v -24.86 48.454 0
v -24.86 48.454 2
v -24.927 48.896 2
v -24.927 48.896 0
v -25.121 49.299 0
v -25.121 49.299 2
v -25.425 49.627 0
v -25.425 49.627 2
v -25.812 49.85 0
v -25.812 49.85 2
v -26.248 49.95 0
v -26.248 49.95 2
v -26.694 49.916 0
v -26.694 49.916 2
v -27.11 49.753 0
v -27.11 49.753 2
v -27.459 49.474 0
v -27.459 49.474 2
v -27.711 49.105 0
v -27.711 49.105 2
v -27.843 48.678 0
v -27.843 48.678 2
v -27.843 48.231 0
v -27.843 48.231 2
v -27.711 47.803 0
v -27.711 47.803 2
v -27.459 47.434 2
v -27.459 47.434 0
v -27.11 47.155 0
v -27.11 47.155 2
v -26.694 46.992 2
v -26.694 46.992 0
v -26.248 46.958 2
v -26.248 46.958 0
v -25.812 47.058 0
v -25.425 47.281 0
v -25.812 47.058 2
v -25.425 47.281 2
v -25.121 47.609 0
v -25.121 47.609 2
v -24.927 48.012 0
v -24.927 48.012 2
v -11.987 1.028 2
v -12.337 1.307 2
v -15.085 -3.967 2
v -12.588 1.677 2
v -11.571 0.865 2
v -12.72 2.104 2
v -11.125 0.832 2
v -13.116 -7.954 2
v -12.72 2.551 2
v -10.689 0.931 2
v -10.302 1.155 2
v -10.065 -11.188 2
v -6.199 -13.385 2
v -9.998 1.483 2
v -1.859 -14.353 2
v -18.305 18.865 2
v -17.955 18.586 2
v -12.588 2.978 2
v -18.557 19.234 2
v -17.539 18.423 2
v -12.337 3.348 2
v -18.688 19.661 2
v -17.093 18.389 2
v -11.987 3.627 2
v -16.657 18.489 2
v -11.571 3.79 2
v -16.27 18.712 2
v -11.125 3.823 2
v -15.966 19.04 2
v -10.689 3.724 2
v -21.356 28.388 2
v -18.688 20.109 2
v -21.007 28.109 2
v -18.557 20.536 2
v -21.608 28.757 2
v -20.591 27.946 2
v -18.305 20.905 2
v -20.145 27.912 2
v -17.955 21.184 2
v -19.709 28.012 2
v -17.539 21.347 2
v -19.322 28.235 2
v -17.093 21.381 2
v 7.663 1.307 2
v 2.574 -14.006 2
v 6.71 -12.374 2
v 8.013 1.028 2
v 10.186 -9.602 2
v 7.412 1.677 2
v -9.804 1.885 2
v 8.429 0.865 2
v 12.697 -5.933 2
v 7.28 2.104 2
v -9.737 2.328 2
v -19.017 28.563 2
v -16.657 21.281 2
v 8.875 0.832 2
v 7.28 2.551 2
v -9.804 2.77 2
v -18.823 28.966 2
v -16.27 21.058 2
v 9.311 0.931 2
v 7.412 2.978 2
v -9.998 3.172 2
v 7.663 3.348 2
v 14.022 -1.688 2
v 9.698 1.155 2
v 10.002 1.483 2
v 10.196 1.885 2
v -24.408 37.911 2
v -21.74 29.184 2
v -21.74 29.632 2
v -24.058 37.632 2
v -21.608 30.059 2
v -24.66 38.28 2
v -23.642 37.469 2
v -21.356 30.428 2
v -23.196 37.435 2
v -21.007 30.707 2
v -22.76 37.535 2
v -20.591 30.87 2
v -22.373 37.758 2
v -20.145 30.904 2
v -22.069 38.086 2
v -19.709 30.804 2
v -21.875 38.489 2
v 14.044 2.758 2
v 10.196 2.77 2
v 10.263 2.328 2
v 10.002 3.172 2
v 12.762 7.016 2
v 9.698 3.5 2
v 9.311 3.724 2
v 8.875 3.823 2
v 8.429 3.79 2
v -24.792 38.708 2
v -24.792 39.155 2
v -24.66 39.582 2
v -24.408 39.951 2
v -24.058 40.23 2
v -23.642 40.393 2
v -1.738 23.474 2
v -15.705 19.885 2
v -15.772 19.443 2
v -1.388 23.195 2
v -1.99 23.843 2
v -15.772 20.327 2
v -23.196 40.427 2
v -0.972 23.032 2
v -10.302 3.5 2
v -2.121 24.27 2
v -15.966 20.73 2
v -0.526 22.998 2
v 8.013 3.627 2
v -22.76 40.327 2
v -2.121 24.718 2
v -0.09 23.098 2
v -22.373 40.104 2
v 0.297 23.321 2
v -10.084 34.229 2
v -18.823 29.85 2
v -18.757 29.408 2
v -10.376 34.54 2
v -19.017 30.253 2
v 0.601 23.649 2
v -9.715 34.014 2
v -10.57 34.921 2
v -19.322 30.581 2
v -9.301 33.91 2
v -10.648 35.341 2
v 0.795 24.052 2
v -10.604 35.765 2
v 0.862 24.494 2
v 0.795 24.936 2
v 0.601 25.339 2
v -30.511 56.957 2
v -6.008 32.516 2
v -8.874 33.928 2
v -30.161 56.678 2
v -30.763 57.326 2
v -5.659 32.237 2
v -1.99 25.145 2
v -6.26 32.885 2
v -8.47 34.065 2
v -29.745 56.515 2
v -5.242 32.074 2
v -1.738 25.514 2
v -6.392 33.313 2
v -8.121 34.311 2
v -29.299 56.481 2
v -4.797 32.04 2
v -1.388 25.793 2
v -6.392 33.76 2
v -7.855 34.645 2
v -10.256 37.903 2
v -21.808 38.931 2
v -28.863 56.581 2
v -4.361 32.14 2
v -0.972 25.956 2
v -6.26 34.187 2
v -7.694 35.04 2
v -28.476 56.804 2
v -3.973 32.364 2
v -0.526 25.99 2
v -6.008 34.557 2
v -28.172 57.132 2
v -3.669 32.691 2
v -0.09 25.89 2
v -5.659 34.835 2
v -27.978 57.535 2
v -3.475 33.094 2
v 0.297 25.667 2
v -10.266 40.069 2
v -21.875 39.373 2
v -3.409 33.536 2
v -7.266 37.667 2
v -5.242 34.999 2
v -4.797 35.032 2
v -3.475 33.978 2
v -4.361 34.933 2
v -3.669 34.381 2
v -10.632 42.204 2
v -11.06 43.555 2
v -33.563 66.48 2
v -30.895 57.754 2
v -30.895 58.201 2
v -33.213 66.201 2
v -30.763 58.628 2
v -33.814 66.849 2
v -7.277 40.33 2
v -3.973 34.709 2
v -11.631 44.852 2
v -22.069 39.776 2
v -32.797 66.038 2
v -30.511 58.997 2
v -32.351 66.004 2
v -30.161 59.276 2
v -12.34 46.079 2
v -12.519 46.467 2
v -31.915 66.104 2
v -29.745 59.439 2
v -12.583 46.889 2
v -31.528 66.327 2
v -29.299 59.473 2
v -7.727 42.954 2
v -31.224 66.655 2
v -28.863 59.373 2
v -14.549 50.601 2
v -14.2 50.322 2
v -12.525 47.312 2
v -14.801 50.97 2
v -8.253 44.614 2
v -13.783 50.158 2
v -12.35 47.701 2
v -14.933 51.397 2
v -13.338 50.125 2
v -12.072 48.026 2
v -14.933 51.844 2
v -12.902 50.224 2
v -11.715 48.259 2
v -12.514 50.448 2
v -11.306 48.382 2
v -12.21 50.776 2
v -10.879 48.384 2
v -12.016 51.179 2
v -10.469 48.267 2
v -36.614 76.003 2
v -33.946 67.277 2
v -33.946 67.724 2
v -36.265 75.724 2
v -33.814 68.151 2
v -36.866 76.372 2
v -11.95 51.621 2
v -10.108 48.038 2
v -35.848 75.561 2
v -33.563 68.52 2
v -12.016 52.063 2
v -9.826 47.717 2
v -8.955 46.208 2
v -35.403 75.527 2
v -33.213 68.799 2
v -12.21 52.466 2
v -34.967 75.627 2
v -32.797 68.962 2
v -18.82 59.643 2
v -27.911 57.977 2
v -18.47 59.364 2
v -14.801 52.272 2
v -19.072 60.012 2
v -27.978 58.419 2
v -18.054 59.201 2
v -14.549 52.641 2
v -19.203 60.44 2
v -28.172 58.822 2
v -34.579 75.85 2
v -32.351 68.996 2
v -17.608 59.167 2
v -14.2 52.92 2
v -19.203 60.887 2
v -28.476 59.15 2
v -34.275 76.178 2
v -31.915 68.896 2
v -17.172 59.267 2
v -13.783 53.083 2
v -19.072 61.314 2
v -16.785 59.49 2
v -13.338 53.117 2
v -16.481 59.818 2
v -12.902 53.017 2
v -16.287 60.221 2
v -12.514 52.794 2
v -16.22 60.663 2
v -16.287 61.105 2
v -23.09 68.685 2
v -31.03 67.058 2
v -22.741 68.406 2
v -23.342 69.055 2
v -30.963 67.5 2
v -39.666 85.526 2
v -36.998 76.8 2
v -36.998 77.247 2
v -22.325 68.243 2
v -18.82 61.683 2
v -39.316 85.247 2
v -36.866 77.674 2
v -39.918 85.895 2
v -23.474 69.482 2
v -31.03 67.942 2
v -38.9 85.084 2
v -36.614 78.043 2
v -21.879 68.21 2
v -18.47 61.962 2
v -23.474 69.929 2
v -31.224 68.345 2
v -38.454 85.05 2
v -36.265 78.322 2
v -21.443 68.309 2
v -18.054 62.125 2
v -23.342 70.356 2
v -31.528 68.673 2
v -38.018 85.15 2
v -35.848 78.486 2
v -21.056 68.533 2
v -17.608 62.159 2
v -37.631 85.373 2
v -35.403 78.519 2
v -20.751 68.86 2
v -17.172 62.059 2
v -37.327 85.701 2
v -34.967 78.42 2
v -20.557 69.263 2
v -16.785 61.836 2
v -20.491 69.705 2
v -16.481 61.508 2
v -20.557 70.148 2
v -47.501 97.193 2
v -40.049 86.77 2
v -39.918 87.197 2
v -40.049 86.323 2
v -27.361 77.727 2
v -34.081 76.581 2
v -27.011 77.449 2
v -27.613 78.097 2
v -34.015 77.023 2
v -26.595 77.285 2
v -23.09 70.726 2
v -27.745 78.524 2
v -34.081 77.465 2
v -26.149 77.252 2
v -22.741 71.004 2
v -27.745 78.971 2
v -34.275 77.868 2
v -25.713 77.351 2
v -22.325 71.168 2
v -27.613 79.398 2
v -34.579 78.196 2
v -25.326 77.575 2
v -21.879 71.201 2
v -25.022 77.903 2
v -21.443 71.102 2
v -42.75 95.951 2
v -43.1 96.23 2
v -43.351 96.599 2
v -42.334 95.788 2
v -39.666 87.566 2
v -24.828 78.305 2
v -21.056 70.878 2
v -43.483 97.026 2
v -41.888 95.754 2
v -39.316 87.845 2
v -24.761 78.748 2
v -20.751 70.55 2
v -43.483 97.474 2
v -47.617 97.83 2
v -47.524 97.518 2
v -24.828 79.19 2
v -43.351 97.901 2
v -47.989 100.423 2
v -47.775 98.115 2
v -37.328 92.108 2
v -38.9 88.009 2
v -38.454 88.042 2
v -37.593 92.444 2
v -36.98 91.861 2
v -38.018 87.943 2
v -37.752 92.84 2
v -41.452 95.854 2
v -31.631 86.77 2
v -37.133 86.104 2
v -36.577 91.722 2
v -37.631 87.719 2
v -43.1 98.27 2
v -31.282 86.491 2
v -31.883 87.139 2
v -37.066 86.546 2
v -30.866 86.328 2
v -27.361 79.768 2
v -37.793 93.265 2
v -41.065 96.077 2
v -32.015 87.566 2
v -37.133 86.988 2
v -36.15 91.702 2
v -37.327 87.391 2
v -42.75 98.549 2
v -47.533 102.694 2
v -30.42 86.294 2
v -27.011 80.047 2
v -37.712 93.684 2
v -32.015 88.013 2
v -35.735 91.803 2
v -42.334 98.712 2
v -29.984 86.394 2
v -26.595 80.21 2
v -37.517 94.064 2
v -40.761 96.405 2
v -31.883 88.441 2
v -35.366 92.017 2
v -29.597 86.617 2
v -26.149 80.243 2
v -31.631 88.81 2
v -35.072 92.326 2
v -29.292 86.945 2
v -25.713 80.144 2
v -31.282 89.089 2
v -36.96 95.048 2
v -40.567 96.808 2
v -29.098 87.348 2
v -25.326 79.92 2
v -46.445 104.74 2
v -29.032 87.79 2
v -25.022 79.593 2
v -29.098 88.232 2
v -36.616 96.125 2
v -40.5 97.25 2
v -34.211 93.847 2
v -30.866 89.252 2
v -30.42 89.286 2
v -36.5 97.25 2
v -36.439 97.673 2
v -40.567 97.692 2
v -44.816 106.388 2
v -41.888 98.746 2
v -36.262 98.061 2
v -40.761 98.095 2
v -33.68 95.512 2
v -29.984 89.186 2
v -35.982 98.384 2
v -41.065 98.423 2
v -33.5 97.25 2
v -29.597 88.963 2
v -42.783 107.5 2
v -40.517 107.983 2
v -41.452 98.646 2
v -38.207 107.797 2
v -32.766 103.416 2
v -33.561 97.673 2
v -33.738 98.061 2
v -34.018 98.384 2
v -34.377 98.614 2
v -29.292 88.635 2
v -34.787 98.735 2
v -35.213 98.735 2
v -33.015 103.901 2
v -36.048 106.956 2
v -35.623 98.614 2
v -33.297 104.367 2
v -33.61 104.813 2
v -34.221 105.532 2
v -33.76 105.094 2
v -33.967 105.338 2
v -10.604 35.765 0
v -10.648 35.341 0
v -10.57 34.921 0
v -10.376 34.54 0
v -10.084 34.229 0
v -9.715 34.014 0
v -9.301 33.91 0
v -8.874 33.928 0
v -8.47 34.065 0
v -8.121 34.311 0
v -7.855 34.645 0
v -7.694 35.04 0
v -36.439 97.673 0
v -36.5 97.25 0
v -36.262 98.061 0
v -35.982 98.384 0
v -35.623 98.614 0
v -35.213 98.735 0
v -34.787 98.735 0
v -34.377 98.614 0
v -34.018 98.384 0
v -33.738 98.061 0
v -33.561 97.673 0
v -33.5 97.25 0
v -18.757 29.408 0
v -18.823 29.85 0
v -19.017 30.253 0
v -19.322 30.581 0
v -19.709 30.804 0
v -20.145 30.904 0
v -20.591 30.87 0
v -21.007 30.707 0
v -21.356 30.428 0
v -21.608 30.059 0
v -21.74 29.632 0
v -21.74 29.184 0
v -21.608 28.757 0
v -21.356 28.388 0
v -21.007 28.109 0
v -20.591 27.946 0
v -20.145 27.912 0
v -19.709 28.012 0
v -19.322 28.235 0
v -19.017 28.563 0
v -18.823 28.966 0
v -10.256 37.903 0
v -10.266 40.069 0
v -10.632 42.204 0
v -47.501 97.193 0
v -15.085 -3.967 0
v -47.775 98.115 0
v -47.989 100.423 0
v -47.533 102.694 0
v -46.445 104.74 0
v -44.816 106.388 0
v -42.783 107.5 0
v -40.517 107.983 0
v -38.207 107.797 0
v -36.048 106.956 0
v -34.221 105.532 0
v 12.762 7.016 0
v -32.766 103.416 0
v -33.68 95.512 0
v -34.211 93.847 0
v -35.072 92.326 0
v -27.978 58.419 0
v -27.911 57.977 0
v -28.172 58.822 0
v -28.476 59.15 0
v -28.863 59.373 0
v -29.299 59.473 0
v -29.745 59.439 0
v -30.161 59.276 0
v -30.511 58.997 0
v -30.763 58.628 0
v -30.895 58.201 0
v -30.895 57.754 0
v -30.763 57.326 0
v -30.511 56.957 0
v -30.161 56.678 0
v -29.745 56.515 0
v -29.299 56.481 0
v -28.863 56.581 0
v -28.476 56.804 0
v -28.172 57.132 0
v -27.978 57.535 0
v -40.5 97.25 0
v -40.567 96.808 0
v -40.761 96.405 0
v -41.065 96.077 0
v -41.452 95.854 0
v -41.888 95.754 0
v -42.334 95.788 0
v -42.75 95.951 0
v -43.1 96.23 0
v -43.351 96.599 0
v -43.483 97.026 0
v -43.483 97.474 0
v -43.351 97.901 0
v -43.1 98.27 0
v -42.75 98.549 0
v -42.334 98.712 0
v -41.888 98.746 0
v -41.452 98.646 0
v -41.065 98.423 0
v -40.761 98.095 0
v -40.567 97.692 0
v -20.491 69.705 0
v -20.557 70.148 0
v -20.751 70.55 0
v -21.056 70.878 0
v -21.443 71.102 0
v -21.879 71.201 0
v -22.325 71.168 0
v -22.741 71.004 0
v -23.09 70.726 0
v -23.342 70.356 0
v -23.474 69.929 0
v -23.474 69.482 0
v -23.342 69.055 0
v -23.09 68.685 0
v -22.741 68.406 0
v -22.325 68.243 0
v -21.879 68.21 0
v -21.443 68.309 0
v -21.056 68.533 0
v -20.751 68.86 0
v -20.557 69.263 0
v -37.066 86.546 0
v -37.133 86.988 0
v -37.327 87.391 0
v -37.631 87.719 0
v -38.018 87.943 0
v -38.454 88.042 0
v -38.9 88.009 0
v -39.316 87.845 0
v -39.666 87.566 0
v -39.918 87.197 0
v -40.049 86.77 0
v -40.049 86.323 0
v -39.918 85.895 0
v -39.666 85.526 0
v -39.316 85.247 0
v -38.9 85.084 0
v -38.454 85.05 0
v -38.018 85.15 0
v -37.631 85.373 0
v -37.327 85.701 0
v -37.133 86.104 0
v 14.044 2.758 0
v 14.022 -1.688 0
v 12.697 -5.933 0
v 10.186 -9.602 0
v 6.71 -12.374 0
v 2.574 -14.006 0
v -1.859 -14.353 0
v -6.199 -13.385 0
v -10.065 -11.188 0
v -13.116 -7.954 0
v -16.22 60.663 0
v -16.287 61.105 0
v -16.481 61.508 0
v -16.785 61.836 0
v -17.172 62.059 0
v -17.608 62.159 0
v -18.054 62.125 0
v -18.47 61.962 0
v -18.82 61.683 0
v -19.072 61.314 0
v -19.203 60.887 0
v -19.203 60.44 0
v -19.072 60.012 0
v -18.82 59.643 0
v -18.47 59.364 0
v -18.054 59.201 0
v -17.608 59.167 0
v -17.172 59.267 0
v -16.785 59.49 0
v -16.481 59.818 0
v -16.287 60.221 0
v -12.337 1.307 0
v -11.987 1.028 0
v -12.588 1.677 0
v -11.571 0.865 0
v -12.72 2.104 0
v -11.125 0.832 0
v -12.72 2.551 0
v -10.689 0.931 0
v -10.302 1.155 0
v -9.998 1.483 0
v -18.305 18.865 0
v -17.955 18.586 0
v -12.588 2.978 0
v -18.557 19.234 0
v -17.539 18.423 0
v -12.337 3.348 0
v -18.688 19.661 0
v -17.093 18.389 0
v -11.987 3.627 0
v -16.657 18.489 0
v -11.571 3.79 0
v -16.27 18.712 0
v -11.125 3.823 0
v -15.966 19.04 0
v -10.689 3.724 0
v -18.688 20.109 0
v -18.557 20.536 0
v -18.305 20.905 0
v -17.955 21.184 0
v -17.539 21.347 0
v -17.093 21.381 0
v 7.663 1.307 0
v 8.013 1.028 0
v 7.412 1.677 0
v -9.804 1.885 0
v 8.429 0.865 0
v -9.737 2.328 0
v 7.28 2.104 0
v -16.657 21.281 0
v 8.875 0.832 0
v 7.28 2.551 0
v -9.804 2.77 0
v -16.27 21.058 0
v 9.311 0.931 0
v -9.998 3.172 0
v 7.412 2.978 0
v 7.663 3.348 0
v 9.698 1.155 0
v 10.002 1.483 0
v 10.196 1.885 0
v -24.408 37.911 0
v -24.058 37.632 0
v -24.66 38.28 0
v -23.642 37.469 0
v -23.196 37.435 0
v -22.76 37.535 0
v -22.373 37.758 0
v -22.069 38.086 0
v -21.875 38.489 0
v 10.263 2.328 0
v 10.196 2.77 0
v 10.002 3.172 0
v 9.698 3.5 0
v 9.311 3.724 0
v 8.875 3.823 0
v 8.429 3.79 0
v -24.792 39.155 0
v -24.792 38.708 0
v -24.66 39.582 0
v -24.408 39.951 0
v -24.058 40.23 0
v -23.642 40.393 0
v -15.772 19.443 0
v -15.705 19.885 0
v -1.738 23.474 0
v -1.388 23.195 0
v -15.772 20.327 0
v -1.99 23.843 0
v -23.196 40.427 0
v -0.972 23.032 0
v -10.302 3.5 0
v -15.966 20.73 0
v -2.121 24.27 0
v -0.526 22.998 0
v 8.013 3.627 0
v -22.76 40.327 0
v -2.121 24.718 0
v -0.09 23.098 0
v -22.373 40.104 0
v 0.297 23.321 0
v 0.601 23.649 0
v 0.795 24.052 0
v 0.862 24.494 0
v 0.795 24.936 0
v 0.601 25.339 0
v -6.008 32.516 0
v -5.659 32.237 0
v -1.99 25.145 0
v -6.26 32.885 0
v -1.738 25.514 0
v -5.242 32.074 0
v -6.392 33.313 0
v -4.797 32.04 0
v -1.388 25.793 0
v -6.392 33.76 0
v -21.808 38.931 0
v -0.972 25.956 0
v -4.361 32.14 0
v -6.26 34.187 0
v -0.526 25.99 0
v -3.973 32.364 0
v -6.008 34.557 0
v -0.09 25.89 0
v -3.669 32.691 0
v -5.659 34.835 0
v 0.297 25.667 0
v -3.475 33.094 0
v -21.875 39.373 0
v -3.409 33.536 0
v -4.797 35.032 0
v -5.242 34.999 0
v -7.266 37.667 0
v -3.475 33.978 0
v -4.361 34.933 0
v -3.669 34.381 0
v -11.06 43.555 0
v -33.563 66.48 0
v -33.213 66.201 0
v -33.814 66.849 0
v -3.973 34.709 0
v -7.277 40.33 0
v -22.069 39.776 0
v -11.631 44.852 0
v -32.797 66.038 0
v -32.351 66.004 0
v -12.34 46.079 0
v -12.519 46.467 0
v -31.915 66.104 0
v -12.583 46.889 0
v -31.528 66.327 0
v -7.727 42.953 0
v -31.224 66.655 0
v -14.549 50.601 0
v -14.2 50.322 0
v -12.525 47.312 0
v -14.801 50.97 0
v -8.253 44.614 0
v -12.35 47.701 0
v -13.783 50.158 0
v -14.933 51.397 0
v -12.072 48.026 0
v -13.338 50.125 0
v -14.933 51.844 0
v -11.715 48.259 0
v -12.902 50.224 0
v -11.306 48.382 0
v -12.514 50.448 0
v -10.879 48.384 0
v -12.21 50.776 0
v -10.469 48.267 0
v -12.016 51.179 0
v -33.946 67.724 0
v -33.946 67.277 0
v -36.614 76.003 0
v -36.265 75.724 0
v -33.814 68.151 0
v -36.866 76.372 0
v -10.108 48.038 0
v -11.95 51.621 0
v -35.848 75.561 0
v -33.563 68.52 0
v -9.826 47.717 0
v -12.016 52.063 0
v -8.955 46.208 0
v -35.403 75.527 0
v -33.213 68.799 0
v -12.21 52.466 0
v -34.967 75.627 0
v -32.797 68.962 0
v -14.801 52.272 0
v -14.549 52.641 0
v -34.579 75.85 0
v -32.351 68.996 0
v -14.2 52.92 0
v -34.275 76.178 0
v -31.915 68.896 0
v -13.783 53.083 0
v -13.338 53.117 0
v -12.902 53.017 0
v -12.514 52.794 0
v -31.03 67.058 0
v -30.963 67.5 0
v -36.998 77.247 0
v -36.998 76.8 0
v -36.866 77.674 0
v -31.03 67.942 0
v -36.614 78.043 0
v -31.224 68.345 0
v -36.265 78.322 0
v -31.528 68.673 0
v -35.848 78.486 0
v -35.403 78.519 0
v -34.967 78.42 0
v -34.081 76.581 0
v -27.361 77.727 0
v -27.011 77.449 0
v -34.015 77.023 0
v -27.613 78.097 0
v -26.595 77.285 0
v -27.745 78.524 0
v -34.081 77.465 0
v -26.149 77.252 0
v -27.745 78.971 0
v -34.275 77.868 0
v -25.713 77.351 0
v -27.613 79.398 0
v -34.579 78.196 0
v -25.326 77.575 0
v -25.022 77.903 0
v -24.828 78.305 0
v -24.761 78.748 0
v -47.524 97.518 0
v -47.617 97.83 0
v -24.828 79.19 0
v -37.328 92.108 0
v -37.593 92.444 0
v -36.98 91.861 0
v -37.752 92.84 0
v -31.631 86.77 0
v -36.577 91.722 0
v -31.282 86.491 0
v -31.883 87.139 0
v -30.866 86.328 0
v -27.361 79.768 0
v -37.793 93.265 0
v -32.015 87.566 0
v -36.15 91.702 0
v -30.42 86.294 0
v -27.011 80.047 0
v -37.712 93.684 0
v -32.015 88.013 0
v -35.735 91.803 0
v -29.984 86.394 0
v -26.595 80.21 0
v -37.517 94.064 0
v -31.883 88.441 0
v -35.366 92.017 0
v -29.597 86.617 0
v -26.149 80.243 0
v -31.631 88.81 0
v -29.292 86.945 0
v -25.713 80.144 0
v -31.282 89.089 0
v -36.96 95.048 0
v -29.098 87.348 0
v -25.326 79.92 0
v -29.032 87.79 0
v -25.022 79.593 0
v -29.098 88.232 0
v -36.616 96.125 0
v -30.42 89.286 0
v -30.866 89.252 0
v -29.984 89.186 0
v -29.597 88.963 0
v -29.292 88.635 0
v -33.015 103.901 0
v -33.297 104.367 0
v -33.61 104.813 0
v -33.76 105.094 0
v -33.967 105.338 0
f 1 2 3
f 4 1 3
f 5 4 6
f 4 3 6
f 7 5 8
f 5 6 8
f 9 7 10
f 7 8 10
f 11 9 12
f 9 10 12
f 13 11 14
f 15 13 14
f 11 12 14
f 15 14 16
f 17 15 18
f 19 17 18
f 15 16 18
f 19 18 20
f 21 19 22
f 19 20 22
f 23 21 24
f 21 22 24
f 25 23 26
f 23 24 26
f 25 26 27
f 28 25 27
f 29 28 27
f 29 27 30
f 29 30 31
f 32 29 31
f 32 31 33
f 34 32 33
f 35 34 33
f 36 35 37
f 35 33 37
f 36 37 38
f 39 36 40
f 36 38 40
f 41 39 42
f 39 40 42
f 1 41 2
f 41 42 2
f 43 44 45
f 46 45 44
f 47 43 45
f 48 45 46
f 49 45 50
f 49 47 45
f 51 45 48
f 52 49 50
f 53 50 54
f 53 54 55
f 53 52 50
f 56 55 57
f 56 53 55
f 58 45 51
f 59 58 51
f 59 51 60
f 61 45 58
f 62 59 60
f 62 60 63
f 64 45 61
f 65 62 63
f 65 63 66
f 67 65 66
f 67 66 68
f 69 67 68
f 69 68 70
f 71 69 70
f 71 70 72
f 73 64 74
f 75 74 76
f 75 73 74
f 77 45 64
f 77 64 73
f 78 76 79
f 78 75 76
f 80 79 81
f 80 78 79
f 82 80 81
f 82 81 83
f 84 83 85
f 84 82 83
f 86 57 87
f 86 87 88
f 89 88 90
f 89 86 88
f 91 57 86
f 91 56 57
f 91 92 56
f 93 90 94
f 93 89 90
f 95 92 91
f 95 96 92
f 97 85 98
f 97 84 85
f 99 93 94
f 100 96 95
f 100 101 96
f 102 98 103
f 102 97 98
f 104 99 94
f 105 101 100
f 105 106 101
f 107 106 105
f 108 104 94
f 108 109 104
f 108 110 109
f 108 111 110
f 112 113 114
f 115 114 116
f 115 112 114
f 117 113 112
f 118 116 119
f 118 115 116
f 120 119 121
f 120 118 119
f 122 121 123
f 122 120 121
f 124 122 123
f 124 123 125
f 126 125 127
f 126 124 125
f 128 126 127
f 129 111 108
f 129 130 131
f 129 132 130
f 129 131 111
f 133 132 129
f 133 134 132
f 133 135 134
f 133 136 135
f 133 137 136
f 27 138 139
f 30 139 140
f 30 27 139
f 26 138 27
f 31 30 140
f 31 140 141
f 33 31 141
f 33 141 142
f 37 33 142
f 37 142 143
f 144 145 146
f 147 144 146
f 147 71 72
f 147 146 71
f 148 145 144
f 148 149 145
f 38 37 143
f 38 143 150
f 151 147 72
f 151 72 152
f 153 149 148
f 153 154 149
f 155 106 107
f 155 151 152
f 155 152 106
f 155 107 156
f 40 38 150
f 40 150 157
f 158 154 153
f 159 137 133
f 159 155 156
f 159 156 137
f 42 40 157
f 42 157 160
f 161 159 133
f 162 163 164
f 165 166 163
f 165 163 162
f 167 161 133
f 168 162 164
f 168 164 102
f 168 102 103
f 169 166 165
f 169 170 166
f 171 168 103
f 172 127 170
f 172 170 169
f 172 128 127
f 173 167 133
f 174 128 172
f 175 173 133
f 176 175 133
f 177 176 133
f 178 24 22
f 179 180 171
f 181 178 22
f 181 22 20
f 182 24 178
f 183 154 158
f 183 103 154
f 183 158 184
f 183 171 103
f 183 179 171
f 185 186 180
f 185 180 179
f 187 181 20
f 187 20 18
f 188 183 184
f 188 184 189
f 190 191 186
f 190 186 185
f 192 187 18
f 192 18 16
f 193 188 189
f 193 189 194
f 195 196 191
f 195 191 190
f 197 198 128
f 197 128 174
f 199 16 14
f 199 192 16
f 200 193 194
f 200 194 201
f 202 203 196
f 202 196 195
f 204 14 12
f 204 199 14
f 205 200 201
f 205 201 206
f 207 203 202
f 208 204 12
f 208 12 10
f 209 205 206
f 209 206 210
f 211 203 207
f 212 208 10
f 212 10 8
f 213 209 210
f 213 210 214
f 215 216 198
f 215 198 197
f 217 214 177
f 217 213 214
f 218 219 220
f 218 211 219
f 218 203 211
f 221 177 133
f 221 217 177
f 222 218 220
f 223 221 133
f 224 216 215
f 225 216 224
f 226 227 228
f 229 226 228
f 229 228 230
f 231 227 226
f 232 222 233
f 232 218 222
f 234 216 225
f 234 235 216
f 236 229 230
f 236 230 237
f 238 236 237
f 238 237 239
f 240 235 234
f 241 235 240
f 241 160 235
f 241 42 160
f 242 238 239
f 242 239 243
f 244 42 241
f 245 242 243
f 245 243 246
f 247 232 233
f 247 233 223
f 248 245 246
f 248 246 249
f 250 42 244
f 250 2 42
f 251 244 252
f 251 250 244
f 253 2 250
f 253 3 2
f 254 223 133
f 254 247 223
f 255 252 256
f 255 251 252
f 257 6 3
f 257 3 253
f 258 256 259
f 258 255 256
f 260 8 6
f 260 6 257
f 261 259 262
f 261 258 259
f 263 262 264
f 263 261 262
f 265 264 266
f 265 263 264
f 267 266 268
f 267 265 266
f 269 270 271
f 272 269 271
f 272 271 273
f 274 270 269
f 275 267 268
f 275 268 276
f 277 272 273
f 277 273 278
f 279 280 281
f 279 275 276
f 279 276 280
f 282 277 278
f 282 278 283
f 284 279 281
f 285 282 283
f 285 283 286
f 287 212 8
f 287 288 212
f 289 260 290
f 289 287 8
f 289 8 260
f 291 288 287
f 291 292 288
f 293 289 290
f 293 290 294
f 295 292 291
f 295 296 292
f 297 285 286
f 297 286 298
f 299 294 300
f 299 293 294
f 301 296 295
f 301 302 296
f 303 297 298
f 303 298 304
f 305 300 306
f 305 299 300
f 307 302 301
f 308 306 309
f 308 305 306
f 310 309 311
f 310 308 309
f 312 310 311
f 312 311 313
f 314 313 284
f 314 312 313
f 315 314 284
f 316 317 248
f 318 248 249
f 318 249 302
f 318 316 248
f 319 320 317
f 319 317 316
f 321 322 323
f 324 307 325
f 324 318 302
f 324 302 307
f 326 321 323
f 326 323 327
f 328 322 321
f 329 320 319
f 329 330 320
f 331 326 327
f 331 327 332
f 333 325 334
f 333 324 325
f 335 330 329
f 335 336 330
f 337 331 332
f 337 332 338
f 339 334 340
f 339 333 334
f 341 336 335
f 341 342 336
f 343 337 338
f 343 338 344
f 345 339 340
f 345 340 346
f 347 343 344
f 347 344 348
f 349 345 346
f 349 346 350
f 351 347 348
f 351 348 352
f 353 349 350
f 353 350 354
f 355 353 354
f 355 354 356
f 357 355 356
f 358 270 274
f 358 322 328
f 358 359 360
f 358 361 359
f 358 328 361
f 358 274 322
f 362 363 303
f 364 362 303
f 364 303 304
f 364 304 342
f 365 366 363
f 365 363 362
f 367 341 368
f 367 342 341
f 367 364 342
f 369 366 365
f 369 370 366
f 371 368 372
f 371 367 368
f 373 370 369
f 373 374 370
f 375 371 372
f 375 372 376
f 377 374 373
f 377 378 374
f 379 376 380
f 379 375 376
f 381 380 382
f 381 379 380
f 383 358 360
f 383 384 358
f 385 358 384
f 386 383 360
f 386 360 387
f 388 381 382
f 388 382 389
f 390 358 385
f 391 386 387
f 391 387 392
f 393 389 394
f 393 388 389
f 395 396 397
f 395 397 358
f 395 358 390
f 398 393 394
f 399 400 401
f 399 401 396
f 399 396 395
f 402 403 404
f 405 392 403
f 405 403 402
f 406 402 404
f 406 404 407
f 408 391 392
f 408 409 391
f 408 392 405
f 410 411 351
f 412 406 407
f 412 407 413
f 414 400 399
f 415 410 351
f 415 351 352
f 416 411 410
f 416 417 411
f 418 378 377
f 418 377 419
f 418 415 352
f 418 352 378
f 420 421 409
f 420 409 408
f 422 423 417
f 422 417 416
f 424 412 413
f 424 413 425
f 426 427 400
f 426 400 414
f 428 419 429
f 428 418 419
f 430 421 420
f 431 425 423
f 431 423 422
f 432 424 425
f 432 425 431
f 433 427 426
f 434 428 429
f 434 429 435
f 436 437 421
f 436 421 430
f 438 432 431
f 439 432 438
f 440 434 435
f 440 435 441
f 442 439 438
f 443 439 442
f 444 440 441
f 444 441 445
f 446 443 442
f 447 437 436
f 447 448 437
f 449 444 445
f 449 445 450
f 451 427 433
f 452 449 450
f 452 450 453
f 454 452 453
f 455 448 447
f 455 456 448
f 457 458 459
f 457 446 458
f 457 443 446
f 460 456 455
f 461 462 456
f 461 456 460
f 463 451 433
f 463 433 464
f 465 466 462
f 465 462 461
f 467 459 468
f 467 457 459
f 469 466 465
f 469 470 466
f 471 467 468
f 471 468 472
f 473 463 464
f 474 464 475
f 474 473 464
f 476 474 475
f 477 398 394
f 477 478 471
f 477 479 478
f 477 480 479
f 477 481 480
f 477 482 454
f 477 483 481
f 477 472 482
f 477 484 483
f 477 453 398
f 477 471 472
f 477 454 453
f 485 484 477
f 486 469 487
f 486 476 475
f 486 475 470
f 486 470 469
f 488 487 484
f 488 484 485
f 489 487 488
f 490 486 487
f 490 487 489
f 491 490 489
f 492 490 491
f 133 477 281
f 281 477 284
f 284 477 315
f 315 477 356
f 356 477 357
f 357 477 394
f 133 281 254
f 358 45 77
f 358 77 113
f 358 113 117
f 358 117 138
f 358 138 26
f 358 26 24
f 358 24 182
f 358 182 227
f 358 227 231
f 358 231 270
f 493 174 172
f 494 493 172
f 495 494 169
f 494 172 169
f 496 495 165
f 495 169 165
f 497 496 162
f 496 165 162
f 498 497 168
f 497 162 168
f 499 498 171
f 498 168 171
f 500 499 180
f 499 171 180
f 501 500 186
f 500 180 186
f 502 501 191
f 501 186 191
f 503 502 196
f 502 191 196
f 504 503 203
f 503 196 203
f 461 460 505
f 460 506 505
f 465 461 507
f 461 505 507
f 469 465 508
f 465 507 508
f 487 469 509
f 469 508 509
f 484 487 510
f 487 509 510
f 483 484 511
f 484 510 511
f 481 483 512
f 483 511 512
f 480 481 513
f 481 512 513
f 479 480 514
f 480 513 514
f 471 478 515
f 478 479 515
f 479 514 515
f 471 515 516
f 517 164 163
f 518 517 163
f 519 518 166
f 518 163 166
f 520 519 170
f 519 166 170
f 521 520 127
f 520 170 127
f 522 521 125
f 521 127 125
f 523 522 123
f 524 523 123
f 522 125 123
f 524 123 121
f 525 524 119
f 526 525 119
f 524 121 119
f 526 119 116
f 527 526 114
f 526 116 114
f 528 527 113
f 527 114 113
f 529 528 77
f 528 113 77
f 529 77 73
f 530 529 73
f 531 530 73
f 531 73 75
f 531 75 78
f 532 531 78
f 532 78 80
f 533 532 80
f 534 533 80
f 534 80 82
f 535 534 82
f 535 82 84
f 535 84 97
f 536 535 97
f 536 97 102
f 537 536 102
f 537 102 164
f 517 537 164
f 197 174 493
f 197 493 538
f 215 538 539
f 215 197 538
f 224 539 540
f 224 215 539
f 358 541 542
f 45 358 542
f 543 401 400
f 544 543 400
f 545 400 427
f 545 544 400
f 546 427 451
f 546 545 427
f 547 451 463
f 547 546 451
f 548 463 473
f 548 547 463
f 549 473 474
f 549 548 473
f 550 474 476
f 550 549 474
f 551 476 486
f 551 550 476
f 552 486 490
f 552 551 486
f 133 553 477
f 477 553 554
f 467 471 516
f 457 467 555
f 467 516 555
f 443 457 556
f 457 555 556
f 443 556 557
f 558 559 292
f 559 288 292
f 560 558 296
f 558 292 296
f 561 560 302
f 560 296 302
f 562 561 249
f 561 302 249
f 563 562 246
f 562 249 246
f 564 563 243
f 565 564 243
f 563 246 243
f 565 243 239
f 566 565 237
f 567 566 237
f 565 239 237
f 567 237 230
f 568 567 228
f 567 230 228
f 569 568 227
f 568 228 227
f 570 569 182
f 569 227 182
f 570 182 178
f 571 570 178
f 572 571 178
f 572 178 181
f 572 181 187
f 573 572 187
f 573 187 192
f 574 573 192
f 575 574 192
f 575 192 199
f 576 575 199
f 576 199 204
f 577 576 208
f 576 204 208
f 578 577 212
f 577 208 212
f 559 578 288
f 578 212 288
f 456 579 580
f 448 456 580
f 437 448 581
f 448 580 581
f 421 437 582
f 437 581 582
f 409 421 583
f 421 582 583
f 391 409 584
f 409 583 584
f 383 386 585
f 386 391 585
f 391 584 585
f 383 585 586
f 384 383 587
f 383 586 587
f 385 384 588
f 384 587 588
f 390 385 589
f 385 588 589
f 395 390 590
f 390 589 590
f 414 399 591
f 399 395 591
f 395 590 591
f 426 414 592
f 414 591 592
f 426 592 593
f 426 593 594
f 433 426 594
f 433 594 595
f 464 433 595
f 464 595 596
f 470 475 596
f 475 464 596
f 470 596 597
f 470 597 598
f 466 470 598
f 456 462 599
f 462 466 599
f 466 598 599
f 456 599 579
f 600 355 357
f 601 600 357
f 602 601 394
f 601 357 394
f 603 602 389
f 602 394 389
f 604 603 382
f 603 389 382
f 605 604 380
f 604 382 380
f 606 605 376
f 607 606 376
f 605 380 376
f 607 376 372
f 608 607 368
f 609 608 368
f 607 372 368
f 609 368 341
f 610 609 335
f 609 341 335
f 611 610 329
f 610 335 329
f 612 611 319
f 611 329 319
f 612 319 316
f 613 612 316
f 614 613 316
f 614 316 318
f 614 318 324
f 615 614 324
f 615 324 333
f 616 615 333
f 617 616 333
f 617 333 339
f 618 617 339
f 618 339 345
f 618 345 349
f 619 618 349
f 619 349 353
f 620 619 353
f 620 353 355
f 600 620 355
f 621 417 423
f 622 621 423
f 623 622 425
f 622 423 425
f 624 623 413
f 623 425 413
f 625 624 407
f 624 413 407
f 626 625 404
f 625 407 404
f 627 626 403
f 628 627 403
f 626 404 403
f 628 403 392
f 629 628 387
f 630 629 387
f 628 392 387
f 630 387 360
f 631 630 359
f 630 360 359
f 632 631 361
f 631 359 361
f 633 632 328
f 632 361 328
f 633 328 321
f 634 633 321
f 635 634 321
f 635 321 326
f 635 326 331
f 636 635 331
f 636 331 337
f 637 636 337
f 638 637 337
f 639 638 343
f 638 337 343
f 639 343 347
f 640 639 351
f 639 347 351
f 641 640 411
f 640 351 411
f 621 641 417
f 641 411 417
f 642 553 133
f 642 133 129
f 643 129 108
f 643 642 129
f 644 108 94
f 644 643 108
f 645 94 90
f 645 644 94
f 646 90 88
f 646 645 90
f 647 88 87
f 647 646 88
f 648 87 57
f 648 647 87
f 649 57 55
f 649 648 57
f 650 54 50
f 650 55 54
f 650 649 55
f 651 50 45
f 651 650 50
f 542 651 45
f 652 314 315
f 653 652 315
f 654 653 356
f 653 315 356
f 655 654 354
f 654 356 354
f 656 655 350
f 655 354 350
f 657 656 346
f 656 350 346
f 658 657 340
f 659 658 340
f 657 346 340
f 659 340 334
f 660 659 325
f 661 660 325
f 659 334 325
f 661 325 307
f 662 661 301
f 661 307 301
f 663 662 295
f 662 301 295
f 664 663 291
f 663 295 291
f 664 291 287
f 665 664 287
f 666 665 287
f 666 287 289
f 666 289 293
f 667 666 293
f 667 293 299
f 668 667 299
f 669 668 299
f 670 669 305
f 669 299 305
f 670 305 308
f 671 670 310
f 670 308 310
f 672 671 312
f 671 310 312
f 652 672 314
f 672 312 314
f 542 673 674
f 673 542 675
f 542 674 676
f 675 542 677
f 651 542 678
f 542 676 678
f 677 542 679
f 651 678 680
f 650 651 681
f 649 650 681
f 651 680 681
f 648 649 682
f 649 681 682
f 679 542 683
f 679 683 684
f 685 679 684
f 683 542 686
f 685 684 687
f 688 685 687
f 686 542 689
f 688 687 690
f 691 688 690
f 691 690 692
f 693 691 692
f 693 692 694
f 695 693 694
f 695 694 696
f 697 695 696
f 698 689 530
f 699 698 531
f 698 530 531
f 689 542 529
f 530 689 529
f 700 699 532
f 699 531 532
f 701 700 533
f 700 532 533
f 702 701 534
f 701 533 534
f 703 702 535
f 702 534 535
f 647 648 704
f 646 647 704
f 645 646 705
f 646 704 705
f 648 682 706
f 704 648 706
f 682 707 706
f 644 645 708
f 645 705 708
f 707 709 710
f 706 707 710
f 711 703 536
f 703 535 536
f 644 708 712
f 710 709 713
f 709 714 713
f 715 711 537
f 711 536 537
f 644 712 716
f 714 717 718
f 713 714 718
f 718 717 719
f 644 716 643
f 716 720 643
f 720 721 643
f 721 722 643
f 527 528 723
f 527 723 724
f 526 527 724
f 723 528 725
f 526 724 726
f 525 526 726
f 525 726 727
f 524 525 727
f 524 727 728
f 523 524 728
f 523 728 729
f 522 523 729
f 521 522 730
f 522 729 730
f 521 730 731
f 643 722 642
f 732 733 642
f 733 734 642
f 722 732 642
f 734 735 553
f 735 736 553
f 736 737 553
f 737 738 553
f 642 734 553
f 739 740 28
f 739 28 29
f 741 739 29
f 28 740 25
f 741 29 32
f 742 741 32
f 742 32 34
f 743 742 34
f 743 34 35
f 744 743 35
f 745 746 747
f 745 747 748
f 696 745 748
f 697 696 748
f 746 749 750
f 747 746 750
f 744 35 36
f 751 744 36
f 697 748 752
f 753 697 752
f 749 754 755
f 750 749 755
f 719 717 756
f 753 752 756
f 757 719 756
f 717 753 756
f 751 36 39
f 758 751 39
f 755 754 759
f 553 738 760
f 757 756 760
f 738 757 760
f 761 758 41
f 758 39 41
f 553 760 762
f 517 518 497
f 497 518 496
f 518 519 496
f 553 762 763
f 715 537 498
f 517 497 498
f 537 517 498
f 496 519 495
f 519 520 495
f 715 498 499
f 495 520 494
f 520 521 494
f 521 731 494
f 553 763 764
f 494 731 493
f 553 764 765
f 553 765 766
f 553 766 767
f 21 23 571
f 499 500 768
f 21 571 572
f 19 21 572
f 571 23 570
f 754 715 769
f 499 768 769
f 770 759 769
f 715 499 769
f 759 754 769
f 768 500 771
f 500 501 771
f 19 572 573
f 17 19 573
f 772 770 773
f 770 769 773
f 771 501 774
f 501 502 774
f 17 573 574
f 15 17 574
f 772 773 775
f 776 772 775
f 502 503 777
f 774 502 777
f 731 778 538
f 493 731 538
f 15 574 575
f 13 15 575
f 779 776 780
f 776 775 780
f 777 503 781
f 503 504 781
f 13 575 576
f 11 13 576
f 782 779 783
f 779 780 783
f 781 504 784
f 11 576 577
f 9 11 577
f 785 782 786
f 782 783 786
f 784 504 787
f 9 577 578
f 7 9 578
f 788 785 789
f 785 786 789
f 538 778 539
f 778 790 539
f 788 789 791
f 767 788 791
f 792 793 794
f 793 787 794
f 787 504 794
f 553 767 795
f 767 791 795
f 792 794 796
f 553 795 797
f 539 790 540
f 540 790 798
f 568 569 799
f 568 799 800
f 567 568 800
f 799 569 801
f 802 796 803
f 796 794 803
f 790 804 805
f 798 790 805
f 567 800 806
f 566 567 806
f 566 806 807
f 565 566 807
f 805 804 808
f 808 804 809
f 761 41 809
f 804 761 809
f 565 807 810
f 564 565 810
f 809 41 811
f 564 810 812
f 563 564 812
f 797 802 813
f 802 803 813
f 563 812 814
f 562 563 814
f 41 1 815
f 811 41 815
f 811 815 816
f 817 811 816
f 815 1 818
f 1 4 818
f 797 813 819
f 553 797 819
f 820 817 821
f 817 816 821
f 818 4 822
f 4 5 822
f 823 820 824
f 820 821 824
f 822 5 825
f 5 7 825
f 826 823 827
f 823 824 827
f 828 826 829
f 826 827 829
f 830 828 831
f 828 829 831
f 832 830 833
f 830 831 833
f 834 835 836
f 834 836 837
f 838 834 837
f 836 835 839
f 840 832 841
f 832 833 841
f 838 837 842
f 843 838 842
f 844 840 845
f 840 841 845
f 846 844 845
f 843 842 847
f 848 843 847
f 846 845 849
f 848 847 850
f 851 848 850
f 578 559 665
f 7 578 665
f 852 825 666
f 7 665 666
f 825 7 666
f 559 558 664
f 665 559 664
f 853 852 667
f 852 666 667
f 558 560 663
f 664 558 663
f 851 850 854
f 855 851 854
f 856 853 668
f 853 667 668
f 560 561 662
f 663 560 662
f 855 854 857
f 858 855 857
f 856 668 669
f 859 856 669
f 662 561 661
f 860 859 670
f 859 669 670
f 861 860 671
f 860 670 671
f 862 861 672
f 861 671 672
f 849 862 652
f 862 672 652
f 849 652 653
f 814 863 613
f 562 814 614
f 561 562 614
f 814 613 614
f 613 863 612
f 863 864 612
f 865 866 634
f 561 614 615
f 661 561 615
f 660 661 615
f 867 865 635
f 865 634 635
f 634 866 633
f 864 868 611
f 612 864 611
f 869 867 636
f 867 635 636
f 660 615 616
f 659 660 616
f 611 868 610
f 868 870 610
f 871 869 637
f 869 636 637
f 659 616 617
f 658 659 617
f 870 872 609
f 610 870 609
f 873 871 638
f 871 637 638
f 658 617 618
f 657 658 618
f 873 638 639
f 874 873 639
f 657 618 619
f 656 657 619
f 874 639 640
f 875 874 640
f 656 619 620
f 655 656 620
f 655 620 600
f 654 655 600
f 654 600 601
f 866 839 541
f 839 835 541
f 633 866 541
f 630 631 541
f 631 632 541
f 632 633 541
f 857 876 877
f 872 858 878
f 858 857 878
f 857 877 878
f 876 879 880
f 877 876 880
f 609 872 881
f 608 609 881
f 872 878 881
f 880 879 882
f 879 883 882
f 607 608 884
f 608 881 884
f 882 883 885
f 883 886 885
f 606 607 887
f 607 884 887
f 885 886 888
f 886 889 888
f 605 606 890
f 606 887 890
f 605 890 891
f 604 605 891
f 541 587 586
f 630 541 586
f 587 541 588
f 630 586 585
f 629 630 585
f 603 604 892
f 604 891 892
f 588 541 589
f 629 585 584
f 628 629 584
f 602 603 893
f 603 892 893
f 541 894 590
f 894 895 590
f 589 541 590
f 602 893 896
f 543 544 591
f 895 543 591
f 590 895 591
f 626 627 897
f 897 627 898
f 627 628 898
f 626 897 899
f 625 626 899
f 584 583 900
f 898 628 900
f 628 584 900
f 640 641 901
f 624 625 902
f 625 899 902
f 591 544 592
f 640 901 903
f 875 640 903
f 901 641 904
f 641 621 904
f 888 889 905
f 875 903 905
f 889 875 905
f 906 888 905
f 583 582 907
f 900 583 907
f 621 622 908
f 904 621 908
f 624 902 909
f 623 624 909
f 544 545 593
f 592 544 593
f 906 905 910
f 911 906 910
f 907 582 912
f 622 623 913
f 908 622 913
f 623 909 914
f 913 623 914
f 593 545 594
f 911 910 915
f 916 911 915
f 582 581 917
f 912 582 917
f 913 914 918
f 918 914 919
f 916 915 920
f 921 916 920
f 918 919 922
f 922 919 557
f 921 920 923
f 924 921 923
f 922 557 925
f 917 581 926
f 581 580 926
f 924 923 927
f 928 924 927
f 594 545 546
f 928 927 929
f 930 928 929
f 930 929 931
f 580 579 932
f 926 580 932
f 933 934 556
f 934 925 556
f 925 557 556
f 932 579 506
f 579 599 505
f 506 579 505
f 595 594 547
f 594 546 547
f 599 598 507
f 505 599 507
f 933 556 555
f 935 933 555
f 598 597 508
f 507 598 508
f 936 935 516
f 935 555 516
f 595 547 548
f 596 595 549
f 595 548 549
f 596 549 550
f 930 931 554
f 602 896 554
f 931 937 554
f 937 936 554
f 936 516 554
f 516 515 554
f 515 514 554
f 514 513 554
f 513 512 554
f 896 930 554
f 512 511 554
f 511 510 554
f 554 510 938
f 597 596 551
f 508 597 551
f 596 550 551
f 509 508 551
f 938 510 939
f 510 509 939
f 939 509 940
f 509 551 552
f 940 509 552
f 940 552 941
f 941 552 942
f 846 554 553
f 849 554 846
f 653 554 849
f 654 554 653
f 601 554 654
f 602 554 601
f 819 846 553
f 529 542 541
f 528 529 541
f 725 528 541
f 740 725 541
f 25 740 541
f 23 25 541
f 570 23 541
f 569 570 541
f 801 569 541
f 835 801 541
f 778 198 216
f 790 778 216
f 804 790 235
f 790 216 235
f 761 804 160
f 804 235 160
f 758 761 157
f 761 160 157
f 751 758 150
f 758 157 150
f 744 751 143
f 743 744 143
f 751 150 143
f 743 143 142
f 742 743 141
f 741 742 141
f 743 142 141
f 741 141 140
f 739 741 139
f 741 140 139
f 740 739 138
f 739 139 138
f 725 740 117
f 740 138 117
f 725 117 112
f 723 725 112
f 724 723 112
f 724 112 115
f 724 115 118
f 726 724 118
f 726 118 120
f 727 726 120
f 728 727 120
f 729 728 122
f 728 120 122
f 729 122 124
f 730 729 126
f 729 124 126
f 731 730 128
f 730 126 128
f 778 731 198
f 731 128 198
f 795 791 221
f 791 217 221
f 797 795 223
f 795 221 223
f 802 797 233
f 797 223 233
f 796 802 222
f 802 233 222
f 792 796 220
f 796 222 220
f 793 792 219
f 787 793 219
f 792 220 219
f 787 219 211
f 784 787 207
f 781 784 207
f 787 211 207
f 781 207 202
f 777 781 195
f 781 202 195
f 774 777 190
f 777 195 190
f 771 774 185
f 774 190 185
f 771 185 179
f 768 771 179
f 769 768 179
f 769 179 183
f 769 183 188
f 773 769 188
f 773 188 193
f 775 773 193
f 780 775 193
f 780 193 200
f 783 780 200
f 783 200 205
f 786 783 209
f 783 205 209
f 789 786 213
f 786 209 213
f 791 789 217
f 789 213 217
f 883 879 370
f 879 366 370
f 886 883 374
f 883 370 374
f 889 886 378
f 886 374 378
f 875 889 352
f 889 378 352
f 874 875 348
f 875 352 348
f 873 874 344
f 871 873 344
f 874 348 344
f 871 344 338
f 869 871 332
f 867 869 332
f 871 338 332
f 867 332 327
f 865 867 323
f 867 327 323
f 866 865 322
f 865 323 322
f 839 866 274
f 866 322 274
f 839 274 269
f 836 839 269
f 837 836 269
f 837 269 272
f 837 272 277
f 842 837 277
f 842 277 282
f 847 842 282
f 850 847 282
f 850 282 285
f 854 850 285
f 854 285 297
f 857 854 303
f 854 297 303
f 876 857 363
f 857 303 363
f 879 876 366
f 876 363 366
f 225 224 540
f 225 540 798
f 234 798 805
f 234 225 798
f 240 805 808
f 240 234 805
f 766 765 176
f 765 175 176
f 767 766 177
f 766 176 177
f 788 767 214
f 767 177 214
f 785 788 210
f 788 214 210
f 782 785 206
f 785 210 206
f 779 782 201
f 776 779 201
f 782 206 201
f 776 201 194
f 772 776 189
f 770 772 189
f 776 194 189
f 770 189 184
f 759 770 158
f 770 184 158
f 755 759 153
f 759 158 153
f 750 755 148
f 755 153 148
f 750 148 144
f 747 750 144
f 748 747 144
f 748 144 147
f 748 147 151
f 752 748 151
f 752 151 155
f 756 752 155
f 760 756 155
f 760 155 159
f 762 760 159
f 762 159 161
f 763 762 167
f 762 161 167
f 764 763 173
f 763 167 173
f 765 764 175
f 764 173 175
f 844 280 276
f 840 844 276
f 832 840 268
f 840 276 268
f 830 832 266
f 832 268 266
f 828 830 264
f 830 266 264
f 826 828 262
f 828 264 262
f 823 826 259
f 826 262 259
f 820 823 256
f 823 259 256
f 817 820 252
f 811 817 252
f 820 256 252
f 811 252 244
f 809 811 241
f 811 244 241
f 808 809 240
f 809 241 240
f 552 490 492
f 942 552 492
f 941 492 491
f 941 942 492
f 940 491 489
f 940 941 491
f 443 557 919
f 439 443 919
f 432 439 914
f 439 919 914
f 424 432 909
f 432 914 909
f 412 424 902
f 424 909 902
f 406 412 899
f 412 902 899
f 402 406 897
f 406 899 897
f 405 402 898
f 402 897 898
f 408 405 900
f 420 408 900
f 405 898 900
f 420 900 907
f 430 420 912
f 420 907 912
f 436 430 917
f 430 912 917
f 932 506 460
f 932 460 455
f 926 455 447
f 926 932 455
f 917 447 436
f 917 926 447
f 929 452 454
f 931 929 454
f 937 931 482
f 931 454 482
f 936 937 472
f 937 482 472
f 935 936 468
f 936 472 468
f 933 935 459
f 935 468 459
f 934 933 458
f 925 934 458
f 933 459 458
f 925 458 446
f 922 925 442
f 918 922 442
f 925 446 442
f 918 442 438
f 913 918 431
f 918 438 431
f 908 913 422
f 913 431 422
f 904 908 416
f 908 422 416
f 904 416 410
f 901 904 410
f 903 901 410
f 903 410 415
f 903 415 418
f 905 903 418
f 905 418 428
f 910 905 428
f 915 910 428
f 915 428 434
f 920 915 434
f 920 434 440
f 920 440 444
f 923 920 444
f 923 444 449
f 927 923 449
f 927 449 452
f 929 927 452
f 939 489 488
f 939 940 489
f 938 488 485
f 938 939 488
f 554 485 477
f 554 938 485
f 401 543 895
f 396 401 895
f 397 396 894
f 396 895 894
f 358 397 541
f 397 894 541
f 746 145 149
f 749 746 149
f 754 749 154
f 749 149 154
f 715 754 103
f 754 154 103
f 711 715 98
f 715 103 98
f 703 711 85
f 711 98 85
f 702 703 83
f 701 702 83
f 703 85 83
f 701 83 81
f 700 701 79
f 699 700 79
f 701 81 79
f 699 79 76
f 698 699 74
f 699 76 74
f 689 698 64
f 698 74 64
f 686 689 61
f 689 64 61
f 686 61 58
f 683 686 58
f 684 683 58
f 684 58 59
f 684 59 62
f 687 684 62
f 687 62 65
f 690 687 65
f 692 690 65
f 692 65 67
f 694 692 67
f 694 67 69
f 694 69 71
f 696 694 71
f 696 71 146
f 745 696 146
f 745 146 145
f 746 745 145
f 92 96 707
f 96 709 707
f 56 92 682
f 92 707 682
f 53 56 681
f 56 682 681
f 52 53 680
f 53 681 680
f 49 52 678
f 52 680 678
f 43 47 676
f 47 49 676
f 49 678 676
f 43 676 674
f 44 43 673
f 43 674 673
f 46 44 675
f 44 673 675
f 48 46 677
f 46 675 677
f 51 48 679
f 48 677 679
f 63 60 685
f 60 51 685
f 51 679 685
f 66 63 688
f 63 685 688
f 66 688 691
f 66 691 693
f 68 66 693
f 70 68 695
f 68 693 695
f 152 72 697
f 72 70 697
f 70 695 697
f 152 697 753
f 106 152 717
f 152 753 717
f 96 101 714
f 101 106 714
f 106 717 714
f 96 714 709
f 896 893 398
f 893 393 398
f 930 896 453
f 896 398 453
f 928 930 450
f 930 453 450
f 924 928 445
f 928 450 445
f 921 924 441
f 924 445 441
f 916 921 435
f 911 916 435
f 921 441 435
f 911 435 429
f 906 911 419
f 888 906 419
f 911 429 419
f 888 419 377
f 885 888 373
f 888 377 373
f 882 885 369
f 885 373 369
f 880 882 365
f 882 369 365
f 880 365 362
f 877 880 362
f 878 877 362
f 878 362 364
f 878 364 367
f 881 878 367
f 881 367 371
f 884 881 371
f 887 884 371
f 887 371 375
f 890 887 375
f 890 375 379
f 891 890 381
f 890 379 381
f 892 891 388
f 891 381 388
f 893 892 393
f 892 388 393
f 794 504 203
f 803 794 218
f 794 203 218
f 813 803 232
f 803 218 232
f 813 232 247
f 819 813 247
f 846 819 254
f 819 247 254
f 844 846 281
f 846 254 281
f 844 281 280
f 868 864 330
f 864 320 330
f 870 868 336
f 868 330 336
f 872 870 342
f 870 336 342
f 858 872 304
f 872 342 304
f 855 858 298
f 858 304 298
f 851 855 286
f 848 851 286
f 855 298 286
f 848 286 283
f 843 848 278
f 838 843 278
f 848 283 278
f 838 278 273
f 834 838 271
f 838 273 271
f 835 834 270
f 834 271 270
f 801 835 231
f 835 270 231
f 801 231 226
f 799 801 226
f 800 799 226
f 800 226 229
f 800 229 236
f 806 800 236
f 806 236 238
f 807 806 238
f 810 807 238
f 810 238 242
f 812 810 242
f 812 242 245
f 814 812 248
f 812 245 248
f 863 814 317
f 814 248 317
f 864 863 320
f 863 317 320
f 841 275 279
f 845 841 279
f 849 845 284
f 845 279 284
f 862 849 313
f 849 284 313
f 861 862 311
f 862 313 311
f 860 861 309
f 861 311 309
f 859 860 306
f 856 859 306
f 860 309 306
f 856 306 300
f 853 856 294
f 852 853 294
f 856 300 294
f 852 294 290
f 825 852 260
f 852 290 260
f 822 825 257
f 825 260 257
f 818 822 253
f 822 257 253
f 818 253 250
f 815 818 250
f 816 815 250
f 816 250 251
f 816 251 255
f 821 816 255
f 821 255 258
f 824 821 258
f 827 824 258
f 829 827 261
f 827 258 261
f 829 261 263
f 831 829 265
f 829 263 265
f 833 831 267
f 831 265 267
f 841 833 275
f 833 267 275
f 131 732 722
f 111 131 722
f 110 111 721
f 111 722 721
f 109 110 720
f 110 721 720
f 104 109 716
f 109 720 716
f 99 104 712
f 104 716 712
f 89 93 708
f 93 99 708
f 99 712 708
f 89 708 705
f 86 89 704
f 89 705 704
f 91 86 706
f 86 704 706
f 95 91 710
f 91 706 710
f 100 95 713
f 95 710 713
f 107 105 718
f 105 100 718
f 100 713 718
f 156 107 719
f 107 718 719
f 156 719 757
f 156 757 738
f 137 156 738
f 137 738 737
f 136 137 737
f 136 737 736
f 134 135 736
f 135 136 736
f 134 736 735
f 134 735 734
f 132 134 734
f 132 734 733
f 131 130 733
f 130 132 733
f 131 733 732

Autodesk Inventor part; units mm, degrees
ref_plane "YZ Plane" through (0, 0, 0) normal (1, 0, 0) x (0, 1, 0)
ref_plane "XZ Plane" through (0, 0, 0) normal (0, 1, 0) x (-1, 0, 0)
ref_plane "XY Plane" through (0, 0, 0) normal (0, 0, 1) x (1, 0, 0)
sketch "Эскиз1" plane through (0, 0, 0) normal (0, 0, 1) x (1, 0, 0)
  line L0 (15, -22.25) -> (15, 22.25) projected
  line L1 (15, 22.25) -> (-20, 22.25) projected
  line L2 (-20, 22.25) -> (-20, -22.25) projected
  line L3 (-20, -22.25) -> (15, -22.25) projected
  circle A0 centre (8.763, 2.3275) radius 1.5 projected
  circle A1 centre (8.763, 7.3275) radius 1.5 projected
  circle A2 centre (-11.237, -7.6725) radius 1.5 projected
  circle A3 centre (-11.237, -2.6725) radius 1.5 projected
  circle A4 centre (8.763, -2.6725) radius 1.5 projected
  circle A5 centre (8.763, -7.6725) radius 1.5 projected
  circle A6 centre (-11.237, 2.3275) radius 1.5 projected
  circle A7 centre (-11.237, 7.3275) radius 1.5 projected
  line L4 (-25, 92.25) -> (-62.0049, 92.25) projected
  line L5 (-103.637, 92.25) -> (-67.893, 92.25) projected
  circle A8 centre (-49, 104.25) radius 1.5 projected
  circle A9 centre (-42, 104.25) radius 1.5 projected
  circle A10 centre (-35, 104.25) radius 1.5 projected
  circle A11 centre (-35, 111.25) radius 1.5 projected
  circle A12 centre (-42, 118.25) radius 1.5 projected
  circle A13 centre (-49, 118.25) radius 1.5 projected
  circle A14 centre (-49, 111.25) radius 1.5 projected
  circle A15 centre (-35, 118.25) radius 1.5 projected
  circle A16 centre (-42, 111.25) radius 1.5 projected
  circle A17 centre (-42, 97.25) radius 1.5 projected
  circle A18 centre (-35, 97.25) radius 1.5 projected
  circle A19 centre (-49, 97.25) radius 1.5 projected
  line L6 (-25, 92.25) -> (-62.0049, 92.25) projected
  line L7 (-25, 95.25) -> (-25, 92.25) projected
  line L8 (-20, 95.25) -> (-25, 95.25) projected
  line L9 (-20, 95.25) -> (-20, 123.25) projected
  line L10 (-28, 123.25) -> (-20, 123.25) projected
  line L11 (-28, 129.25) -> (-28, 123.25) projected
  line L12 (-28, 129.25) -> (-62.0049, 129.25) projected
  line L13 (-62.0049, 92.25) -> (-62.0049, 129.25) projected
  line L14 (-5.1452, 11.625) -> (-40, 100) construction
  arc A20 (-32.5697, 102.9649) -> (-47.4303, 97.0351) centre (-40, 100) ccw
  line L15 (-5.1452, 11.625) -> (-22.5726, 55.8125) construction
  arc A21 (-13.8135, 8.0713) -> (-4.3725, 15.1785) centre (-0.8009, 0.6099) ccw
  line L16 (12.7625, 7.0157) -> (-32.7662, 103.4164)
  line L17 (-47.6184, 97.5588) -> (-15.0854, -3.9674)
  point P0 (0, 0)
  point P1 (-13.8589, 33.7187)
  point P2 (-33.6095, 104.8127)
  point P3 (-34.2206, 105.5316)
  point P4 (-47.7749, 98.1155)
  point P5 (-47.5011, 97.1926)
  dimension "d0" = 8
  dimension "d1" = 95
  dimension "d2" = 100
  dimension "d3" = 40
  dimension "d4" = 15
extrude "Выдавливание1" add sketch "Эскиз1" along normal blind 2 contours L16 A21 L17 L2 L1 | L1 L2 L17 L4 L16 | L4 L17 A19 A20 A10 L16 | A20 A10 | A10 A20 | A1 | A2 | A3 | A4 | A5 | A7 | A9
sketch "Эскиз2" plane through (0, 0, 2) normal (0, 0, 1) x (1, 0, 0)
  circle A0 centre (-38.5661, 86.5462) radius 1.5
  line L0 (-47.5011, 97.1926) -> (-15.0854, -3.9674) projected
  circle A1 centre (-35.5146, 77.0232) radius 1.5
  circle A2 centre (-32.463, 67.5001) radius 1.5
  circle A3 centre (-29.4114, 57.9771) radius 1.5
  circle A4 centre (-26.3599, 48.4541) radius 1.5
  circle A5 centre (-23.3083, 38.9311) radius 1.5
  circle A6 centre (-20.2568, 29.408) radius 1.5
  circle A7 centre (-17.2052, 19.885) radius 1.5
  circle A8 centre (-42, 97.25) radius 1.5 projected
  circle A9 centre (-11.237, 2.3275) radius 1.5 projected
  point P0 (0, 0)
  dimension "d7" = 3
  dimension "d10" = 10
  dimension "d17" = 5.2562
  dimension "d18" = 5.26
extrude "Выдавливание2" cut sketch "Эскиз2" against normal blind 3 contours A0 | A1 | A2 | A3 | A4 | A5 | A6 | A7
sketch "Эскиз3" plane through (0, 0, 2) normal (0, 0, 1) x (1, 0, 0)
  circle A0 centre (-35, 97.25) radius 1.5 projected
  line L0 (12.7625, 7.0157) -> (-32.7662, 103.4164) projected
  circle A1 centre (-30.5318, 87.7899) radius 1.5
  circle A2 centre (-26.2613, 78.7476) radius 1.5
  circle A3 centre (-21.9908, 69.7054) radius 1.5
  circle A4 centre (-17.7202, 60.6631) radius 1.5
  circle A5 centre (-13.4497, 51.6208) radius 1.5
  circle A6 centre (-9.1792, 42.5786) radius 1.5
  circle A7 centre (-4.9086, 33.5363) radius 1.5
  circle A8 centre (-0.6381, 24.494) radius 1.5
  point P0 (0, 0)
  dimension "d19" = 3
  dimension "d20" = 4.6533
  dimension "d21" = 4.653
  dimension "d24" = 10
extrude "Выдавливание3" cut sketch "Эскиз3" against normal blind 3 contours A1 | A2 | A3 | A4 | A5 | A6 | A7 | A8
sketch "Эскиз4" plane through (0, 0, 0) normal (0, 0, -1) x (-1, 0, 0)
  circle A0 centre (42, 97.25) radius 1.5 projected
  circle A1 centre (35, 97.25) radius 1.5 projected
  arc A2 (35, 97.25) -> (36.2942, 93.1949) centre (42, 97.25) ccw construction
  arc A3 (33.5, 97.25) -> (35.0715, 92.326) centre (42, 97.25) ccw
  arc A4 (36.5, 97.25) -> (37.5169, 94.0639) centre (42, 97.25) ccw
  arc A5 (36.5, 97.25) -> (33.5, 97.25) centre (35, 97.25) ccw
  arc A6 (35.0715, 92.326) -> (37.5169, 94.0639) centre (36.2942, 93.1949) ccw
  point P0 (0, 0)
extrude "Выдавливание4" cut sketch "Эскиз4" against normal blind 3 contours A4 A6 A3 A1
sketch "Эскиз5" plane through (0, 0, 2) normal (0, 0, 1) x (1, 0, 0)
  circle A0 centre (-42, 97.25) radius 1.5 projected
  arc A1 (-35.0715, 92.326) -> (-33.5, 97.25) centre (-42, 97.25) ccw projected
  arc A2 (-37.5169, 94.0639) -> (-35.0715, 92.326) centre (-36.2942, 93.1949) ccw projected
  arc A3 (-37.5169, 94.0639) -> (-36.5, 97.25) centre (-42, 97.25) ccw projected
  arc A4 (-33.5, 97.25) -> (-36.5, 97.25) centre (-35, 97.25) ccw projected
  circle A5 centre (-11.237, 2.3275) radius 1.5 projected
  circle A6 centre (8.763, 2.3275) radius 1.5 projected
  arc A7 (-15.0854, -3.9674) -> (12.7625, 7.0157) centre (-0.8009, 0.6099) ccw projected
  line L0 (12.7625, 7.0157) -> (-32.7662, 103.4164) projected
  arc A8 (-32.7662, 103.4164) -> (-33.6095, 104.8127) centre (-40, 100) ccw projected
  arc A9 (-33.6095, 104.8127) -> (-34.2206, 105.5316) centre (-35, 104.25) ccw projected
  arc A10 (-34.2206, 105.5316) -> (-47.7749, 98.1155) centre (-40, 100) ccw projected
  arc A11 (-47.5011, 97.1926) -> (-47.7749, 98.1155) centre (-49, 97.25) ccw projected
  line L1 (-47.5011, 97.1926) -> (-15.0854, -3.9674) projected
  circle A12 centre (-17.2052, 19.885) radius 1.5 projected
  circle A13 centre (-23.3083, 38.9311) radius 1.5 projected
  circle A14 centre (-38.5661, 86.5462) radius 1.5 projected
  circle A15 centre (-32.463, 67.5001) radius 1.5 projected
  circle A16 centre (-29.4114, 57.9771) radius 1.5 projected
  circle A17 centre (-35.5146, 77.0232) radius 1.5 projected
  circle A18 centre (-20.2568, 29.408) radius 1.5 projected
  circle A19 centre (-26.3599, 48.4541) radius 1.5 projected
  circle A20 centre (-0.6381, 24.494) radius 1.5 projected
  circle A21 centre (-26.2613, 78.7476) radius 1.5 projected
  circle A22 centre (-4.9086, 33.5363) radius 1.5 projected
  circle A23 centre (-13.4497, 51.6208) radius 1.5 projected
  circle A24 centre (-17.7202, 60.6631) radius 1.5 projected
  circle A25 centre (-9.1792, 42.5786) radius 1.5 projected
  circle A26 centre (-30.5318, 87.7899) radius 1.5 projected
  circle A27 centre (-21.9908, 69.7054) radius 1.5 projected
  circle A28 centre (-23.3083, 38.9311) radius 1.5 projected
  circle A29 centre (-9.1792, 42.5786) radius 1.5 projected
  arc A30 (-9.149, 35.4026) -> (-9.1792, 42.5786) centre (-23.3083, 38.9311) ccw construction
  arc A31 (-7.6935, 35.0399) -> (-7.7268, 42.9535) centre (-23.3083, 38.9311) ccw
  arc A32 (-10.6045, 35.7653) -> (-10.6316, 42.2036) centre (-23.3083, 38.9311) ccw
  arc A33 (-10.6045, 35.7653) -> (-7.6935, 35.0399) centre (-9.149, 35.4026) ccw
  arc A34 (-7.7268, 42.9535) -> (-10.6316, 42.2036) centre (-9.1792, 42.5786) ccw
  arc A35 (-9.1792, 42.5786) -> (-11.0829, 46.8983) centre (-23.3083, 38.9311) ccw construction
  arc A36 (-7.7268, 42.9535) -> (-9.8263, 47.7173) centre (-23.3083, 38.9311) ccw
  arc A37 (-10.6316, 42.2036) -> (-12.3396, 46.0794) centre (-23.3083, 38.9311) ccw
  arc A38 (-10.6316, 42.2036) -> (-7.7268, 42.9535) centre (-9.1792, 42.5786) ccw
  arc A39 (-9.8263, 47.7173) -> (-12.3396, 46.0794) centre (-11.0829, 46.8983) ccw
  point P0 (0, 0)
  point P1 (-10.6316, 42.2036)
  point P2 (-10.6316, 42.2036)
  point P3 (-10.6316, 42.2036)
  point P4 (-7.7268, 42.9535)
  point P5 (-7.7268, 42.9535)
  point P6 (-7.7268, 42.9535)
extrude "Выдавливание5" cut sketch "Эскиз5" against normal blind 3 contours A25 A31 A33 A32 | A25 A37 A39 A36
properties part number "ЛЦМК000002.00.00.00.00.19 мост"
